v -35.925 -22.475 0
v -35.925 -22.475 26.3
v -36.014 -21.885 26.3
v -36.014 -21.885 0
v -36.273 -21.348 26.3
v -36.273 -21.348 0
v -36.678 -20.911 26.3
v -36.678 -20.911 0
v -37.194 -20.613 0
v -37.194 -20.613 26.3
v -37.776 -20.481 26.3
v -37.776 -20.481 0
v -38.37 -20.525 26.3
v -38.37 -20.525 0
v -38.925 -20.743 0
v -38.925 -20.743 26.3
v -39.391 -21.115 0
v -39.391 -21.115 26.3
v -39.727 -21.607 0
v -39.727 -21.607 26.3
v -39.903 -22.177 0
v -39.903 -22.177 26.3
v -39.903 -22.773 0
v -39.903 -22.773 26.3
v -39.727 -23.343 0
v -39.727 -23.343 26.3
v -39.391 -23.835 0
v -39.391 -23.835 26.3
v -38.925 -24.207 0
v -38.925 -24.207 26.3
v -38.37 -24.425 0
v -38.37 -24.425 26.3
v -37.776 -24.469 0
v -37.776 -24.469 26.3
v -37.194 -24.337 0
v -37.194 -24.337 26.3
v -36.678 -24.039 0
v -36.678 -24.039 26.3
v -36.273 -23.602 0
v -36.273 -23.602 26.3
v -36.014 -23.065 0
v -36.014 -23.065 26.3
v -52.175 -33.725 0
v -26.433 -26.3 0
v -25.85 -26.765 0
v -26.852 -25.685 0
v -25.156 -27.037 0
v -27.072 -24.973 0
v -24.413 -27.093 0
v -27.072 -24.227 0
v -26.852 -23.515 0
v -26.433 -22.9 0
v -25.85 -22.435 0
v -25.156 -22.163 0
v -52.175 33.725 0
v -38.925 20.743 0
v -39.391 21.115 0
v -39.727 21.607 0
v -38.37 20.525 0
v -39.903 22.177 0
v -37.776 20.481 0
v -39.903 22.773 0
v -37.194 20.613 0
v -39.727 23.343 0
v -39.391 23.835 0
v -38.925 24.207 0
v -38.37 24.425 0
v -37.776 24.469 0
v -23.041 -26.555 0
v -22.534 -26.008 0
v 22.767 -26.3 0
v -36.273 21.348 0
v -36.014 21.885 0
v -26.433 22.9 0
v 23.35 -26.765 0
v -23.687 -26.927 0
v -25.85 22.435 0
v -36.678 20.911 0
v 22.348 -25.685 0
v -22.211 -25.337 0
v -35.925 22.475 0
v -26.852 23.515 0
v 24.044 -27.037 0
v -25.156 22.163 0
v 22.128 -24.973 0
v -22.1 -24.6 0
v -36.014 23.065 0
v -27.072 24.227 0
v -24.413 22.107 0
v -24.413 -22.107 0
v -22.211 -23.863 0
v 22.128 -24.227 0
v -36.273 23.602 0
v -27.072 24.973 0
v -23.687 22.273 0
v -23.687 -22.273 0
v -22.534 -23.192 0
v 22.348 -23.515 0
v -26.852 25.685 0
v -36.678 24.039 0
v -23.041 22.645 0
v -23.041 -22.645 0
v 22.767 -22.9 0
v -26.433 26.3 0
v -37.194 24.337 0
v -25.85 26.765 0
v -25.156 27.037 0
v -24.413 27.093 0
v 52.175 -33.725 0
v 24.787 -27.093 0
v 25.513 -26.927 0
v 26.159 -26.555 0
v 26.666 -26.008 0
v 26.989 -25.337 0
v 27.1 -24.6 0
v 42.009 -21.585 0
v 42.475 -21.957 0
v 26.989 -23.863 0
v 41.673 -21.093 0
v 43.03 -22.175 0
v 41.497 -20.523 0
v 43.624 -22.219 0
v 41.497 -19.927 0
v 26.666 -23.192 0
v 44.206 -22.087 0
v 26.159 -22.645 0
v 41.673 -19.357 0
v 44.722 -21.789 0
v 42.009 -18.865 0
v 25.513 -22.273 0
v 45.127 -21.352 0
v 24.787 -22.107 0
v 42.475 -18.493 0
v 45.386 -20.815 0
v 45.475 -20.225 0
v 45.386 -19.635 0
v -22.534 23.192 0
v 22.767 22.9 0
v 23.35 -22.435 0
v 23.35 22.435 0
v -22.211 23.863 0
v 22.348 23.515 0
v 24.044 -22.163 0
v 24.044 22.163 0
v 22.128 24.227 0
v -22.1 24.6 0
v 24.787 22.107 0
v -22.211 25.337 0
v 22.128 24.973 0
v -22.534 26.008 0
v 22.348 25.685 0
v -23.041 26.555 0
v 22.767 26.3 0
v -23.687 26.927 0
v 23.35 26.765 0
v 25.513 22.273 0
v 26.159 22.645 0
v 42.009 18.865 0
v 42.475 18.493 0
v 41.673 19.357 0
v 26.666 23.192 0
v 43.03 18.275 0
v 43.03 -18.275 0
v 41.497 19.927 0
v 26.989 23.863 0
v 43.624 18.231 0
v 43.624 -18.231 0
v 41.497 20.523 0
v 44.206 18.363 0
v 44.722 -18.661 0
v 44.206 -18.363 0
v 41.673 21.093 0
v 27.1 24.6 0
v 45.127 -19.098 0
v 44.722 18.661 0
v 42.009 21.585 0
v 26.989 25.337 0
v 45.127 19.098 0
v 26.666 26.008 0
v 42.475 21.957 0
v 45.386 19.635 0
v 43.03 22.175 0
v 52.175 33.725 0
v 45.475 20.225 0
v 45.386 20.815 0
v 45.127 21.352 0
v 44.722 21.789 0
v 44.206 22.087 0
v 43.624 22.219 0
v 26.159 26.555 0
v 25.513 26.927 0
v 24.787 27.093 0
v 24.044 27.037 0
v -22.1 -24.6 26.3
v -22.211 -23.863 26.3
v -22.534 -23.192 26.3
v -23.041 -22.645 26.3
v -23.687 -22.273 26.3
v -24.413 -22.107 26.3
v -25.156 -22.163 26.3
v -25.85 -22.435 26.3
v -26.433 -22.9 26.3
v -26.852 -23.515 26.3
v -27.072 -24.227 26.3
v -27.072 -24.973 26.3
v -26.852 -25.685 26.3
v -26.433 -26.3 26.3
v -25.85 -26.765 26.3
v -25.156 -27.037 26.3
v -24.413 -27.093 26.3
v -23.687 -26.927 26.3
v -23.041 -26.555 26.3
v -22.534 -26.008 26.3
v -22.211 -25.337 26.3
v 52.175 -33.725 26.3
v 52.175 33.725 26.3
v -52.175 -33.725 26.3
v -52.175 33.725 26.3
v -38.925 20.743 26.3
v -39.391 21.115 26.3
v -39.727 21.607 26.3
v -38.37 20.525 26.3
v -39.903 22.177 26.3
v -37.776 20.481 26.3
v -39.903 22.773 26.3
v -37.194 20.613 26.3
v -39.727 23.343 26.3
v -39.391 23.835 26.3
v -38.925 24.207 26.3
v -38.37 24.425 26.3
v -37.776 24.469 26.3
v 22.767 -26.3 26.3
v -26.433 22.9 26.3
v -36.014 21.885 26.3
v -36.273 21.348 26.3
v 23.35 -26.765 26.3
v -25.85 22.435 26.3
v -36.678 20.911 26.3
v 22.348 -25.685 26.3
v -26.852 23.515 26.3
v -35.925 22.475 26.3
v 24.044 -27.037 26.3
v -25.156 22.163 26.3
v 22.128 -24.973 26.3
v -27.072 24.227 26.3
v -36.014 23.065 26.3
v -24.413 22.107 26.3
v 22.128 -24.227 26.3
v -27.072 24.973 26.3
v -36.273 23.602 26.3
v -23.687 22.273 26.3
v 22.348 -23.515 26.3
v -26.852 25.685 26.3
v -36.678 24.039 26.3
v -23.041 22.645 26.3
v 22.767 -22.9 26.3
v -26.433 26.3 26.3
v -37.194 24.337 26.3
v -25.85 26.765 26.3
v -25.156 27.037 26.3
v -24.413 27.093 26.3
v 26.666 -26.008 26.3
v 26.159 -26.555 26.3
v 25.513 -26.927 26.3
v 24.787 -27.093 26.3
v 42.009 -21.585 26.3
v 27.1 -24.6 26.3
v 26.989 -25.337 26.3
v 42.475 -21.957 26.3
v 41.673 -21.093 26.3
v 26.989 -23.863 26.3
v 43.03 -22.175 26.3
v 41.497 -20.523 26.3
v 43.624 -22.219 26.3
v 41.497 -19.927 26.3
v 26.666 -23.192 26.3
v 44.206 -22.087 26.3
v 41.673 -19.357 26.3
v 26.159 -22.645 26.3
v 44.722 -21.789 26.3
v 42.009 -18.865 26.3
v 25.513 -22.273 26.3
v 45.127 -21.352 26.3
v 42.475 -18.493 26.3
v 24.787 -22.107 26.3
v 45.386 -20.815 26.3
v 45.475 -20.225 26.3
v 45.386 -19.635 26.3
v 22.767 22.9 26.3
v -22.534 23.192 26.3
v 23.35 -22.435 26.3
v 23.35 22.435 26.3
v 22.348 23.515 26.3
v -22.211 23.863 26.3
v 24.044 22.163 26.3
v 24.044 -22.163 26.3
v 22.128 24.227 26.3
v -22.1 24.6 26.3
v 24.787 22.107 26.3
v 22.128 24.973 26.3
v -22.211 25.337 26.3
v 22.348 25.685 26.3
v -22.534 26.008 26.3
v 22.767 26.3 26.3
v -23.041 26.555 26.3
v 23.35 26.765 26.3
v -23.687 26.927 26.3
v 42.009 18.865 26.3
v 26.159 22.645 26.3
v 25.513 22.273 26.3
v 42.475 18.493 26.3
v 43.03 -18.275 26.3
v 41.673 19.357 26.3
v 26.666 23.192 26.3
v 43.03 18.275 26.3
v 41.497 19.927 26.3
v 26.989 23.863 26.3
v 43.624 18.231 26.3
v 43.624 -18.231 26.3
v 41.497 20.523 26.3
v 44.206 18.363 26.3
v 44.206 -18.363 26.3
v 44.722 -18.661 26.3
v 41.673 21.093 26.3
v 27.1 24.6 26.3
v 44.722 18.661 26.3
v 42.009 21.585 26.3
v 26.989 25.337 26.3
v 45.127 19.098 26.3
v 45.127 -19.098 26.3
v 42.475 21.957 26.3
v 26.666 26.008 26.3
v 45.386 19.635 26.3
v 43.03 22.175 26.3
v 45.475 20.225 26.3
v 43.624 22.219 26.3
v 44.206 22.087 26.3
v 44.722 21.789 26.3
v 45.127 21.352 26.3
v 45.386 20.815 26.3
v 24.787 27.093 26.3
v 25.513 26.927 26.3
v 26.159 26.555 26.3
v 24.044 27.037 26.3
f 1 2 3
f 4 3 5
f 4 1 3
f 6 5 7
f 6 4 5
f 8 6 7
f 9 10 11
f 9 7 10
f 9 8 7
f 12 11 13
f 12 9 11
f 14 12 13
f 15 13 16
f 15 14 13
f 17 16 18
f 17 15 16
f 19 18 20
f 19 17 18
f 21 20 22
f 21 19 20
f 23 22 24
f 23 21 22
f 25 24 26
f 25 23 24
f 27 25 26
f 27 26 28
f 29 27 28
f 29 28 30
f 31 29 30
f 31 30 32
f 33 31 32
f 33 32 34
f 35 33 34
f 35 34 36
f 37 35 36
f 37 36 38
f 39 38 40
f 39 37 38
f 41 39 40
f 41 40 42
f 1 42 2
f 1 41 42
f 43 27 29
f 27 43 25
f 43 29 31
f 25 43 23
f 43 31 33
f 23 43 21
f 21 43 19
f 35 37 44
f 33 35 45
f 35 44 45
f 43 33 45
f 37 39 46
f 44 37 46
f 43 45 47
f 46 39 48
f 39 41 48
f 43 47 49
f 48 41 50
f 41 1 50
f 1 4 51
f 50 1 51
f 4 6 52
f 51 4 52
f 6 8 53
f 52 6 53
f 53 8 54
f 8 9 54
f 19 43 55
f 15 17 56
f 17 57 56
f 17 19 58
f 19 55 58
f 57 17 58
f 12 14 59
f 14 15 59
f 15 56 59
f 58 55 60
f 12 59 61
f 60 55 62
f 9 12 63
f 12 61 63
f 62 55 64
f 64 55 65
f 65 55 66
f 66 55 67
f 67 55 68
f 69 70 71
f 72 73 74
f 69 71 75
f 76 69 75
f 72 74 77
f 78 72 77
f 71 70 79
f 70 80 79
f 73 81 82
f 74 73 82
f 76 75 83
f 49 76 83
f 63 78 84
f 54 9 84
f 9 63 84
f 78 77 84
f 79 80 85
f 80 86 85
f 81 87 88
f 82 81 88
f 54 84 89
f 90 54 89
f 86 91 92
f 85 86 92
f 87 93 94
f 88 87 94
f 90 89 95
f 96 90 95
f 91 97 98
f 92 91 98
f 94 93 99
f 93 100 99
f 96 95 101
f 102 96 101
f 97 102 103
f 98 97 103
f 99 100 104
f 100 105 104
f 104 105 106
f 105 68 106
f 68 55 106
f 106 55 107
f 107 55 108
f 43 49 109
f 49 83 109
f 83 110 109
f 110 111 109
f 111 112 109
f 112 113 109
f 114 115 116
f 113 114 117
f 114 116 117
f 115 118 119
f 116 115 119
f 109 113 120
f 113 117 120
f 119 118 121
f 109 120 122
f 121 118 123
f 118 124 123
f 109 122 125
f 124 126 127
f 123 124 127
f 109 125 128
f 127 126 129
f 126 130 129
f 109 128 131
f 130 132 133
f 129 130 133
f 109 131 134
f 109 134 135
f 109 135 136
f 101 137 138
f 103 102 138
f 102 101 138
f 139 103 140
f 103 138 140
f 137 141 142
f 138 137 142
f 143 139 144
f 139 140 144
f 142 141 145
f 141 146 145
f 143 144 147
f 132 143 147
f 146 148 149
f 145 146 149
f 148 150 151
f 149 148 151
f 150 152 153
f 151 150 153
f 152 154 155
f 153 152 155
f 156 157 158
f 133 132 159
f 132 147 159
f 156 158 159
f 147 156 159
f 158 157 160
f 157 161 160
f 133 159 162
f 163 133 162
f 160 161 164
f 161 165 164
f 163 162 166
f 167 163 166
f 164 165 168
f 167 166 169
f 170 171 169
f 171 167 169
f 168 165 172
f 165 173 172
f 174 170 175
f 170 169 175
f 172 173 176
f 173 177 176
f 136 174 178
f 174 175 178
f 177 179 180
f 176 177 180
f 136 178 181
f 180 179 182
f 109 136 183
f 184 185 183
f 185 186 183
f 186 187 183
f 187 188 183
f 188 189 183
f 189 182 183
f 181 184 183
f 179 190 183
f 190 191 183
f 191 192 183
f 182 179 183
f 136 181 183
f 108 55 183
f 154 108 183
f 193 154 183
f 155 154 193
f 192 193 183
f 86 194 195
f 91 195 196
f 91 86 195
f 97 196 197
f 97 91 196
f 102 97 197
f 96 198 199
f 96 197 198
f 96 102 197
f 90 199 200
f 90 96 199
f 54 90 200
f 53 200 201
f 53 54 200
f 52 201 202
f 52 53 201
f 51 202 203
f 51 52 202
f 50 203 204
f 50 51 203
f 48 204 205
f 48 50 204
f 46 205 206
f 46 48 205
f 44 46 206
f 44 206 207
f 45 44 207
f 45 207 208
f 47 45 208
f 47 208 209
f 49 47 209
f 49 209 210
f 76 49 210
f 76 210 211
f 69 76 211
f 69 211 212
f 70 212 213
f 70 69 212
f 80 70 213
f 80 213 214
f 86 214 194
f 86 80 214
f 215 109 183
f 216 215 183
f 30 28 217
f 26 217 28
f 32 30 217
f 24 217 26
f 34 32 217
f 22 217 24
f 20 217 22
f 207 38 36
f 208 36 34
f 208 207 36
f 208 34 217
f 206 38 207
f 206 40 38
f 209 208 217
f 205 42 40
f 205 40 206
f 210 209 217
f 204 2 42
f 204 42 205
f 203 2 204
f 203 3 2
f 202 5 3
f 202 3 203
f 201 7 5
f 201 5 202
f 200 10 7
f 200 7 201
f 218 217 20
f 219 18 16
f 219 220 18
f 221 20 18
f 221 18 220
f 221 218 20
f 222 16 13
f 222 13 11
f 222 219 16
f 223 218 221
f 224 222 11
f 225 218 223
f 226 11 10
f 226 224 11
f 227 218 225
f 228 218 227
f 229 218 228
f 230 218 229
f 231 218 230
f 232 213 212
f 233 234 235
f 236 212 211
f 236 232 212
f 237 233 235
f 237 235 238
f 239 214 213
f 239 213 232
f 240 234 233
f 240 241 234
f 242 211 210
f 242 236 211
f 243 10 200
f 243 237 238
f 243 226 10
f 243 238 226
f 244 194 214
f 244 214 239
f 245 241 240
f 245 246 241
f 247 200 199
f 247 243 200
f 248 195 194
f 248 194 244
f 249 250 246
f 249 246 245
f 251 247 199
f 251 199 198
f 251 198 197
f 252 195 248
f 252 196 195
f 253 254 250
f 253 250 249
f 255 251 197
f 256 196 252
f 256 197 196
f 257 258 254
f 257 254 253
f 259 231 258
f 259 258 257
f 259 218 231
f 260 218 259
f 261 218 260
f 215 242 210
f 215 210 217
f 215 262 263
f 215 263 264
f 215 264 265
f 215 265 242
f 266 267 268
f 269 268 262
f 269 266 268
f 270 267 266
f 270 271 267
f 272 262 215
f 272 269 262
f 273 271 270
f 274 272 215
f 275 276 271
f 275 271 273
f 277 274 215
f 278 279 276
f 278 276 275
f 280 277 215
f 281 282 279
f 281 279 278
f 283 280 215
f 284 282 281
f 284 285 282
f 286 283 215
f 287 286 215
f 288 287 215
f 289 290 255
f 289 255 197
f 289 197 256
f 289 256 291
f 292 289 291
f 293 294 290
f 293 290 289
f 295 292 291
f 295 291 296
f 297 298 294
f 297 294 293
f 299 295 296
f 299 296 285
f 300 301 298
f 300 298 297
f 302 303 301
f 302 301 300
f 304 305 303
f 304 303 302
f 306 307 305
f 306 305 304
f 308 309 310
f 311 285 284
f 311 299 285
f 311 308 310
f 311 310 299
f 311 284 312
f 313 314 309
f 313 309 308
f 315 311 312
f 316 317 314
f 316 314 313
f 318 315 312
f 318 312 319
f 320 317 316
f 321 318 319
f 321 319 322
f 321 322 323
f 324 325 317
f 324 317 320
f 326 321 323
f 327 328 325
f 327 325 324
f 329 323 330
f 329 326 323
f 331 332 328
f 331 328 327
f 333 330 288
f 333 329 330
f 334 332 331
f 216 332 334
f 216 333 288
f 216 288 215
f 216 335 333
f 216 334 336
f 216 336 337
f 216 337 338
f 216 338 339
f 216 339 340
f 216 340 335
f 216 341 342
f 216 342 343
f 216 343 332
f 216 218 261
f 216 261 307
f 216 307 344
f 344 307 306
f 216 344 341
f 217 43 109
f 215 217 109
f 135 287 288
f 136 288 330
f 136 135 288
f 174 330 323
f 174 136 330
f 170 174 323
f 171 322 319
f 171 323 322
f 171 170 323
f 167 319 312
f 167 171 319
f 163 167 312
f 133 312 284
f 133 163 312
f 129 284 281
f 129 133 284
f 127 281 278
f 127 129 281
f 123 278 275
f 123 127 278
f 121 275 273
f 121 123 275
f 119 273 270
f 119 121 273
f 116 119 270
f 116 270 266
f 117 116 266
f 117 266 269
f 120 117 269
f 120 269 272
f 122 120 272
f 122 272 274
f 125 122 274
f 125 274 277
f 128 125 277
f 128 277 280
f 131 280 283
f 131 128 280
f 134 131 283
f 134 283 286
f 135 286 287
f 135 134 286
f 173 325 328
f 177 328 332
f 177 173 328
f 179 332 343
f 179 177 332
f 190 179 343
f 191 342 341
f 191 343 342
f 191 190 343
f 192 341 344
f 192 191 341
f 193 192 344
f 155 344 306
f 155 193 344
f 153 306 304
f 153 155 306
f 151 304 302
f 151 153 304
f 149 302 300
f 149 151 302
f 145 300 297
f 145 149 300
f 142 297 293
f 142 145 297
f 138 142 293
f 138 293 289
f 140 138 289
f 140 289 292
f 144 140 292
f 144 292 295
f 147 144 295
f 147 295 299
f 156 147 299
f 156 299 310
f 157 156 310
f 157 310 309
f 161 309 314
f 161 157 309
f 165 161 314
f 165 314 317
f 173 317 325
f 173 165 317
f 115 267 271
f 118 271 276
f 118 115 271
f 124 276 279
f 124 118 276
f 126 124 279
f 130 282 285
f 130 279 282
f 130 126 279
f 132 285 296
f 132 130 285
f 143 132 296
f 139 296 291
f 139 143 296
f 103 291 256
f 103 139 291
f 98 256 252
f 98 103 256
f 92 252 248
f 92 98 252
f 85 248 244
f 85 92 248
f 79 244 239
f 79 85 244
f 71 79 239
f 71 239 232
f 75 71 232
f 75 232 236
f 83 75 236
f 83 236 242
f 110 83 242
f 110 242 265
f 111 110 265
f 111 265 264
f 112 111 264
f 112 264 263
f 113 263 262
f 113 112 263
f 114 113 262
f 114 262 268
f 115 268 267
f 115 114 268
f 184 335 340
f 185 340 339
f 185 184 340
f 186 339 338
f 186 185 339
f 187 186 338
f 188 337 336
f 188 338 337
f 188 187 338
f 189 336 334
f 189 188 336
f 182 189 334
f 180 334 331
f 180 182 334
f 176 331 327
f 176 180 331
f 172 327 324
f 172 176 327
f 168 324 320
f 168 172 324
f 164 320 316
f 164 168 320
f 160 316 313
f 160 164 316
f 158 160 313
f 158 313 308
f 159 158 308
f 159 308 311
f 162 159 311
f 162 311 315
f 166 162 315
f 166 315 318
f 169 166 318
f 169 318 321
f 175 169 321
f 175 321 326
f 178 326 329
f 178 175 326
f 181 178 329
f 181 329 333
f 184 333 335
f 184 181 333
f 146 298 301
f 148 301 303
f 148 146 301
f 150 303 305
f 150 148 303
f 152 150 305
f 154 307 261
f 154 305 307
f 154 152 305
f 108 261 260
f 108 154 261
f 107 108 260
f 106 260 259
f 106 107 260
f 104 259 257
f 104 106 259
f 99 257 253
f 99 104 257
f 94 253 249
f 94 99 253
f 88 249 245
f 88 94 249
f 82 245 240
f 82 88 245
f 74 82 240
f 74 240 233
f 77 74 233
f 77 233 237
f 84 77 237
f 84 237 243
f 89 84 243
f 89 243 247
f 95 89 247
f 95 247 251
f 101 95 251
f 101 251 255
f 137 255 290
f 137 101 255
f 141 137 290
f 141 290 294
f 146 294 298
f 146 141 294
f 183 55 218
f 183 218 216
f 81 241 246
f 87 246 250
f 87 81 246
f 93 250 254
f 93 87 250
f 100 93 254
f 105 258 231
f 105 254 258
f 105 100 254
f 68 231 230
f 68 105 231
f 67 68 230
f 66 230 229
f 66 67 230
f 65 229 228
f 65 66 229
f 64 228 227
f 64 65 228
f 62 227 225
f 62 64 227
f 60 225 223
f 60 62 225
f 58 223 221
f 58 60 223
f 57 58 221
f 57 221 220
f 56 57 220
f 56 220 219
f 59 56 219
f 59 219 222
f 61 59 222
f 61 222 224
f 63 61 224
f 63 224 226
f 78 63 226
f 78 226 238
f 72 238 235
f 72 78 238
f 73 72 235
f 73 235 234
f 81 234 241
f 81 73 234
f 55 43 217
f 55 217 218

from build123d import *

# Parameters (mm, degrees)
F0_W     = 104.35
F0_H     = 67.45
F1_DEPTH = 26.3
F2_R     = 2.5
F3_DEPTH = 26.301
F4_R     = 2
F5_DEPTH = 70.6


with BuildPart() as f1:
    # F0 (on Top) → F1 (new body)
    with BuildSketch(Plane.XY):
        Rectangle(F0_W, F0_H)
    extrude(amount=F1_DEPTH)

    # F2 (on Top) → F3 (cut, through all)
    with BuildSketch(Plane.XY):
        with Locations((-24.6, 24.6)):
            Circle(F2_R)
        with Locations((-24.6, -24.6)):
            Circle(F2_R)
        with Locations((24.6, -24.6)):
            Circle(F2_R)
        with Locations((24.6, 24.6)):
            Circle(F2_R)
    extrude(amount=F3_DEPTH, mode=Mode.SUBTRACT)

    # F4 (on Top) → F5 (cut)
    with BuildSketch(Plane.XY):
        with Locations((43.475, 20.225)):
            Circle(F4_R)
        with Locations((43.475, -20.225)):
            Circle(F4_R)
        with Locations((-37.925, 22.475)):
            Circle(F4_R)
        with Locations((-37.925, -22.475)):
            Circle(F4_R)
    extrude(amount=F5_DEPTH, mode=Mode.SUBTRACT)


solid = f1.part
